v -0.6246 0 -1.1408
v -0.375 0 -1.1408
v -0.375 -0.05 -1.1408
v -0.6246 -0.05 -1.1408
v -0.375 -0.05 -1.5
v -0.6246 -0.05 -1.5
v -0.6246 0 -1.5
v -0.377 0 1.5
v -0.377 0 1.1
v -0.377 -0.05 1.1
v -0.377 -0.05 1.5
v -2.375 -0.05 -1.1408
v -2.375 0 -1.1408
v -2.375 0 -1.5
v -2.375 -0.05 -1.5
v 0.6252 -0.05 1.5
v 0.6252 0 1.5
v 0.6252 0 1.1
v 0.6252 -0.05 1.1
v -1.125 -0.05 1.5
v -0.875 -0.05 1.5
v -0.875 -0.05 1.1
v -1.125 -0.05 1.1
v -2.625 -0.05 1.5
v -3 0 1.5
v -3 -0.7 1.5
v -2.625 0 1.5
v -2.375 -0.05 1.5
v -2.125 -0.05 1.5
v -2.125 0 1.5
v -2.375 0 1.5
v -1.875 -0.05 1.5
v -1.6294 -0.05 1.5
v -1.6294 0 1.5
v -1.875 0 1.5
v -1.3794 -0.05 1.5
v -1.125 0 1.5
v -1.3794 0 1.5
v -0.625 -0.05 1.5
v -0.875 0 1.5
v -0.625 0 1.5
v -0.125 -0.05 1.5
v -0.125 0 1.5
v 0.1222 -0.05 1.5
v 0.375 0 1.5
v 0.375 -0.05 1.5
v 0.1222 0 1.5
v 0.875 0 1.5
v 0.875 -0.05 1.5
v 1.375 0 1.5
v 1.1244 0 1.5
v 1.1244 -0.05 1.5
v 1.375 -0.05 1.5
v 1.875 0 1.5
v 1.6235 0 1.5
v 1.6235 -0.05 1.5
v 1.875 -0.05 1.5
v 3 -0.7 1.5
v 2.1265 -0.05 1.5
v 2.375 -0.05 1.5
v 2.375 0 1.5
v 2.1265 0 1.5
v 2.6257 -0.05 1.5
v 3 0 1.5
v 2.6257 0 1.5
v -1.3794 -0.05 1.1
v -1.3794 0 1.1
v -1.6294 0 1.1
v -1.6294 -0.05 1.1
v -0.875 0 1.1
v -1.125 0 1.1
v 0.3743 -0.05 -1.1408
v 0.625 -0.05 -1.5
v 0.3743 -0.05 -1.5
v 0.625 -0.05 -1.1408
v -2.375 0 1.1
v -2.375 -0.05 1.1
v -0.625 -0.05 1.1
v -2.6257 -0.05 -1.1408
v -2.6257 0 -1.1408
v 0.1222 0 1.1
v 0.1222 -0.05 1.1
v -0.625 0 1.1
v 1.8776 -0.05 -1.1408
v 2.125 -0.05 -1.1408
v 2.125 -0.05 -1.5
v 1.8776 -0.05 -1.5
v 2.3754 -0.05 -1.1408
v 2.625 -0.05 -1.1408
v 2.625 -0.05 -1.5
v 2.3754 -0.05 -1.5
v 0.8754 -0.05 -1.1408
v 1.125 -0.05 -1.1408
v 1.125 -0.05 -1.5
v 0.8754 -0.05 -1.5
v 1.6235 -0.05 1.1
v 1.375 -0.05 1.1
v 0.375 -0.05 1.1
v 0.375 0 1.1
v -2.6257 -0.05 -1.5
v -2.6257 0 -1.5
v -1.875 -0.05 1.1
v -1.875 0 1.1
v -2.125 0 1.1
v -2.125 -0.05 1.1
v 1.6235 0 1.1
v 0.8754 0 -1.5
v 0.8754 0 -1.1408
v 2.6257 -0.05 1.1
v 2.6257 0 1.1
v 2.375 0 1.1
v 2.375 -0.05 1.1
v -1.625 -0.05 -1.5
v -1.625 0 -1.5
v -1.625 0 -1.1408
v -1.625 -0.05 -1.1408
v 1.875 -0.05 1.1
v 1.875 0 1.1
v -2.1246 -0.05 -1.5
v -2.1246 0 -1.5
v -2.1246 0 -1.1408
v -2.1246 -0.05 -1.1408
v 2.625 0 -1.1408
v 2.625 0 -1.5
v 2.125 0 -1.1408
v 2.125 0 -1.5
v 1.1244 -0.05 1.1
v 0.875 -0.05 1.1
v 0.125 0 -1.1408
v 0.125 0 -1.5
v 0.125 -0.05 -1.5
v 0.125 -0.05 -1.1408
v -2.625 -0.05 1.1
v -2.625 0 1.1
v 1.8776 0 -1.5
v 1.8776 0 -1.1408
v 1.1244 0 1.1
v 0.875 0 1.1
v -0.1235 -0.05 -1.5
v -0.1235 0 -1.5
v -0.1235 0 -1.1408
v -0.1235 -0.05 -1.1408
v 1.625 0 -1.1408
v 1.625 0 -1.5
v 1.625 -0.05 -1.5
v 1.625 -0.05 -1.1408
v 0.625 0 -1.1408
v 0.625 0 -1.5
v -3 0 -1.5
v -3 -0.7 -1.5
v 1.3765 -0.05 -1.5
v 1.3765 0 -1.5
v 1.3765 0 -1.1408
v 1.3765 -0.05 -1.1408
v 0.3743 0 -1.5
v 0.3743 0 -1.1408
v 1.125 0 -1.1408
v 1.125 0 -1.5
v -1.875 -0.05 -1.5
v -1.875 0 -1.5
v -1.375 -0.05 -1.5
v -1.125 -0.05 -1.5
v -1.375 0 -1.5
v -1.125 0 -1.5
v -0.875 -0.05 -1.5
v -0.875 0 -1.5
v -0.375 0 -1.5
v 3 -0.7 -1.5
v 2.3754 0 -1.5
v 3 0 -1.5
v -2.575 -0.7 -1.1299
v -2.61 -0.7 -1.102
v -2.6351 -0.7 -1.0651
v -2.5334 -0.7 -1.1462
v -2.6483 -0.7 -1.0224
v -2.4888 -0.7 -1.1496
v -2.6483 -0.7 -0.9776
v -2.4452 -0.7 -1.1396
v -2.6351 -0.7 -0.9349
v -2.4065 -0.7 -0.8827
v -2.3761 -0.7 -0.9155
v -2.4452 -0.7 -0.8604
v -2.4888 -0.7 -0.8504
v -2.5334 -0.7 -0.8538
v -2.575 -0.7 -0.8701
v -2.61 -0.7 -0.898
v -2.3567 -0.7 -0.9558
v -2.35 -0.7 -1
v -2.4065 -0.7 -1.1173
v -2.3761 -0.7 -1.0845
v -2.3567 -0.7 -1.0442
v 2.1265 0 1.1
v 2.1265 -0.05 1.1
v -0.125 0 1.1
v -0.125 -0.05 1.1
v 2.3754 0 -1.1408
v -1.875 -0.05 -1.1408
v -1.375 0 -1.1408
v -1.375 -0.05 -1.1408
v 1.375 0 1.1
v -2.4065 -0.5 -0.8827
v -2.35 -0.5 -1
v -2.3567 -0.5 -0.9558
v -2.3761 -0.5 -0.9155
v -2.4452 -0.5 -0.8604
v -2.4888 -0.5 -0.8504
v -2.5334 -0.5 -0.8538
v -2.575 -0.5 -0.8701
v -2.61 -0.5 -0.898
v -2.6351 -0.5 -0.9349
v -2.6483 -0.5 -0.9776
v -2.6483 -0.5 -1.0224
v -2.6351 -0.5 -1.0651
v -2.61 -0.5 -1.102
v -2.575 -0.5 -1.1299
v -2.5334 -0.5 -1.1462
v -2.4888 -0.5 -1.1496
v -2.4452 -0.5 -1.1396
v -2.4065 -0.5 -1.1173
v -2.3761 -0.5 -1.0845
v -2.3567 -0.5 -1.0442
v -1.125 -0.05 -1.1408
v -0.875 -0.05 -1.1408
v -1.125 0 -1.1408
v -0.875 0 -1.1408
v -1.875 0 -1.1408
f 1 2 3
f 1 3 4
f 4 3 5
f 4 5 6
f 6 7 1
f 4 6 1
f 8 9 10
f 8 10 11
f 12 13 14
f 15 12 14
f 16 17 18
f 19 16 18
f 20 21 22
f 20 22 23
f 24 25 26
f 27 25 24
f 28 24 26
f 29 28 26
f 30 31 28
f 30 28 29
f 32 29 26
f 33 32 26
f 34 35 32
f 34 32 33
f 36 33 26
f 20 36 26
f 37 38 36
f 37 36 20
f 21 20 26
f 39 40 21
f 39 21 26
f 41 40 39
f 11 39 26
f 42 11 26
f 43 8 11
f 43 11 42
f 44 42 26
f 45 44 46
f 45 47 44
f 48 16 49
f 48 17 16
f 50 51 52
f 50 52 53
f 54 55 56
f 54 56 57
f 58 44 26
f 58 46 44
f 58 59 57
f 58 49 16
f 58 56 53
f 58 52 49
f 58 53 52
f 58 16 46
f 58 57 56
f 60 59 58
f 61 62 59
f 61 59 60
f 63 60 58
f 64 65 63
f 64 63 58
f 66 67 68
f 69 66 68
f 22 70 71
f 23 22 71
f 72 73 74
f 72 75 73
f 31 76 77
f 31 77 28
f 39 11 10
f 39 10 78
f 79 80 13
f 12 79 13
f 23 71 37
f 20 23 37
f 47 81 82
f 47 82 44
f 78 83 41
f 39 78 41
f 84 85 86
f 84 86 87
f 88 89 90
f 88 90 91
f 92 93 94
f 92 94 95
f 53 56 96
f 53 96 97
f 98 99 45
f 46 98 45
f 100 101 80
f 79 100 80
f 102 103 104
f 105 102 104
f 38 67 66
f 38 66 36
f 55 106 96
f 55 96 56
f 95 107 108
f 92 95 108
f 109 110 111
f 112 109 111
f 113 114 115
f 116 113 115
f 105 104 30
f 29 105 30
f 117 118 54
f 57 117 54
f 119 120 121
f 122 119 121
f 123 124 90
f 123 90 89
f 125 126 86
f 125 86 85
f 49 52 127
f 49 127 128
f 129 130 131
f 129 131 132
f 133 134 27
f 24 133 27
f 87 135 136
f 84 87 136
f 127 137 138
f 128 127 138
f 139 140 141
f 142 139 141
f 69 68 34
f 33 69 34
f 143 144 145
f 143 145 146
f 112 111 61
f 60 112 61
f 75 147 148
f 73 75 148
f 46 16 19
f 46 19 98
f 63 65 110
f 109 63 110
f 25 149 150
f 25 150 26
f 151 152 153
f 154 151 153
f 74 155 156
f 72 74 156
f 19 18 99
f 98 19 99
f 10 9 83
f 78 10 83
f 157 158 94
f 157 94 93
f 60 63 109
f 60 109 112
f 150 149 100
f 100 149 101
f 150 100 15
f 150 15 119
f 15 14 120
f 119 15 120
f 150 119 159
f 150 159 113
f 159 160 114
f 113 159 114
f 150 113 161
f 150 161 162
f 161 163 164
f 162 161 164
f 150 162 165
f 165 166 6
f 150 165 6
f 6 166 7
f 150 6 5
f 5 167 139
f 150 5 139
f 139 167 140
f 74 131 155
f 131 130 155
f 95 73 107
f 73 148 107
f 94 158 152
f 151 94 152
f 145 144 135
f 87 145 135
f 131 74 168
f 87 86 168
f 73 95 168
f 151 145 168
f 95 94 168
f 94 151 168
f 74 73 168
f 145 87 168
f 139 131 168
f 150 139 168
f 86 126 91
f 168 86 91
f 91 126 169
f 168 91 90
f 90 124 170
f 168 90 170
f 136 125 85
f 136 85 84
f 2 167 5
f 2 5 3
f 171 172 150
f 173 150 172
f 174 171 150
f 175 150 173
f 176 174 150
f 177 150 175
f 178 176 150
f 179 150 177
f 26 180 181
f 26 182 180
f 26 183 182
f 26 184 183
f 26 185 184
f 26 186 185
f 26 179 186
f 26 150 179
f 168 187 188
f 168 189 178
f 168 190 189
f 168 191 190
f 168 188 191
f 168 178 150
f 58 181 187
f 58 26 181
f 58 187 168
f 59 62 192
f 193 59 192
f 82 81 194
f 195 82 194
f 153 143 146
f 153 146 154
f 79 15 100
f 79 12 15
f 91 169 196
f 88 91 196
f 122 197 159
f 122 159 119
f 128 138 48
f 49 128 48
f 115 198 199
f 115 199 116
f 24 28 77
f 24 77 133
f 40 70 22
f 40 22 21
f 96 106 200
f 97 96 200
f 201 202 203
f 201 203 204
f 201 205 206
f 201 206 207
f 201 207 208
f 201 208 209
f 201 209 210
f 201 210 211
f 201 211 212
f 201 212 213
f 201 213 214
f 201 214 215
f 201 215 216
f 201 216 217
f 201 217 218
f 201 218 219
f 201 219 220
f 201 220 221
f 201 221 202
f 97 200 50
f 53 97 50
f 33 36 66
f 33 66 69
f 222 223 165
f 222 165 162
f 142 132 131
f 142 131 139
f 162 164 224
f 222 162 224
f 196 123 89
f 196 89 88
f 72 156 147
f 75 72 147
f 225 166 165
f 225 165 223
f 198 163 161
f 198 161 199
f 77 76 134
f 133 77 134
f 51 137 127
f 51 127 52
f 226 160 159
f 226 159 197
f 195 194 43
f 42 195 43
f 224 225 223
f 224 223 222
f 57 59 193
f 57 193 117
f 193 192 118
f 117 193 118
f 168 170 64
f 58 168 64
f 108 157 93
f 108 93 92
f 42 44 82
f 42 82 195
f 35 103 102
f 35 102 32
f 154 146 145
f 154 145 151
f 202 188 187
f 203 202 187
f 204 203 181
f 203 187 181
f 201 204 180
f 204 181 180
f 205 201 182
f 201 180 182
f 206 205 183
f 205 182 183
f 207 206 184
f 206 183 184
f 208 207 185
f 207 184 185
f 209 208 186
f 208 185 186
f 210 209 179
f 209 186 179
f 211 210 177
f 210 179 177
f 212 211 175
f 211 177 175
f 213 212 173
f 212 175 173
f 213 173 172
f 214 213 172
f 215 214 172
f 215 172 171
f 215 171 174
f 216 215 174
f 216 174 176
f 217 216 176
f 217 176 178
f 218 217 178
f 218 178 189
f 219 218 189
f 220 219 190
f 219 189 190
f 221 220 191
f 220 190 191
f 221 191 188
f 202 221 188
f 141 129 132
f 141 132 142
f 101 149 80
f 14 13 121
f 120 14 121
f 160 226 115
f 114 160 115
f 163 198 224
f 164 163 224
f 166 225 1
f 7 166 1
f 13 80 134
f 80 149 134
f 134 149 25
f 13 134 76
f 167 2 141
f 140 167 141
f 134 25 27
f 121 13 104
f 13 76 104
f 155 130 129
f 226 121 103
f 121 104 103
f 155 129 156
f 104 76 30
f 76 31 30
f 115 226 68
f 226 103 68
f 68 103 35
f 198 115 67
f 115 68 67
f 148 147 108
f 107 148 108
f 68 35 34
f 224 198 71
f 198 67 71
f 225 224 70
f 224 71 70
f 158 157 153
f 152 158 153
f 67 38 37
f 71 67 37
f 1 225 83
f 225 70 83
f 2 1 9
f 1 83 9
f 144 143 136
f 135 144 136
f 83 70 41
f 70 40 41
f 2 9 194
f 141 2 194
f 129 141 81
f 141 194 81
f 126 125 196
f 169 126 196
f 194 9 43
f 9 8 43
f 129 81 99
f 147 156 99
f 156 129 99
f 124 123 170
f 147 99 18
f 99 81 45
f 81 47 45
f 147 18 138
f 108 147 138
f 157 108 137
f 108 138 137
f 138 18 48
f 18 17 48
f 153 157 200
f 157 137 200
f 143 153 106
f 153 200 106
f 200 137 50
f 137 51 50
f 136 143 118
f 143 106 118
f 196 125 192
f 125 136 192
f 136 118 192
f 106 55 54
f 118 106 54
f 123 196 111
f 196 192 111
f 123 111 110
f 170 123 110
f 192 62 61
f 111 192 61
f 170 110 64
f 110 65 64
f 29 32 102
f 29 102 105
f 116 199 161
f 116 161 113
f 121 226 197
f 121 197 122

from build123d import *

# Parameters (mm, degrees)
F0_W     = 6
F0_H     = 3
F1_DEPTH = 0.7
F2_R     = 0.15
F3_DEPTH = 0.2
F4_W     = 0.249578
F4_H     = 0.359219
F4_W_2   = 0.25
F4_W_3   = 0.249593
F4_W_4   = 0.248513
F4_W_5   = 0.249608
F4_W_6   = 0.248528
F4_W_7   = 0.247448
F4_W_8   = 0.249623
F4_W_9   = 0.248526
F4_H_2   = 0.4
F4_W_10  = 0.249373
F4_W_11  = 0.247199
F4_W_12  = 0.248047
F5_DEPTH = 0.05


with BuildPart() as f1:
    # F0 (on Front) → F1 (new body)
    with BuildSketch(Plane.XZ):
        Rectangle(F0_W, F0_H)
    extrude(amount=F1_DEPTH)

    # F2 (on face) → F3 (cut)
    with BuildSketch(Plane.XZ.offset(0.7)):
        with Locations((-2.5, -1)):
            Circle(F2_R)
    extrude(amount=-F3_DEPTH, mode=Mode.SUBTRACT)

    # F4 (on face) → F5 (cut)
    with BuildSketch(Plane(origin=(0, 0, 0), x_dir=(-1, 0, 0), z_dir=(0, 1, 0))):
        Polygon((2.375, -1.5), (2.625657, -1.5), (2.625657, -1.140781), (2.625, -1.140781), (2.375, -1.140781), align=None)
        with Locations((1.999789, -1.320391)):
            Rectangle(F4_W, F4_H)
        with Locations((1.5, -1.320391)):
            Rectangle(F4_W_2, F4_H)
        with Locations((1, -1.320391)):
            Rectangle(F4_W_2, F4_H)
        with Locations((0.499796, -1.320391)):
            Rectangle(F4_W_3, F4_H)
        with Locations((-0.000744, -1.320391)):
            Rectangle(F4_W_4, F4_H)
        Polygon((-0.625, -1.5), (-0.374313, -1.5), (-0.374313, -1.140781), (-0.375, -1.140781), (-0.625, -1.140781), align=None)
        with Locations((-1.000196, -1.320391)):
            Rectangle(F4_W_5, F4_H)
        with Locations((-1.500736, -1.320391)):
            Rectangle(F4_W_6, F4_H)
        with Locations((-2.001276, -1.320391)):
            Rectangle(F4_W_7, F4_H)
        with Locations((-2.500189, -1.320391)):
            Rectangle(F4_W_8, F4_H)
        Polygon((-2.375, 1.1), (-2.375, 1.5), (-2.6257, 1.5), (-2.6257, 1.1), (-2.625, 1.1), align=None)
        Polygon((-1.875, 1.1), (-1.875, 1.5), (-2.126548, 1.5), (-2.126548, 1.1), (-2.125, 1.1), align=None)
        with Locations((-1.499263, 1.3)):
            Rectangle(F4_W_9, F4_H_2)
        with Locations((-0.999686, 1.3)):
            Rectangle(F4_W_10, F4_H_2)
        Polygon((-0.375, 1.1), (-0.375, 1.5), (-0.625221, 1.5), (-0.625221, 1.1), (-0.625, 1.1), align=None)
        with Locations((0.001401, 1.3)):
            Rectangle(F4_W_11, F4_H_2)
        with Locations((0.500976, 1.3)):
            Rectangle(F4_W_12, F4_H_2)
        with Locations((1, 1.3)):
            Rectangle(F4_W_2, F4_H_2)
        with Locations((1.504384, 1.3)):
            Rectangle(F4_W_2, F4_H_2)
        with Locations((2, 1.3)):
            Rectangle(F4_W_2, F4_H_2)
        with Locations((2.5, 1.3)):
            Rectangle(F4_W_2, F4_H_2)
    extrude(amount=-F5_DEPTH, mode=Mode.SUBTRACT)


solid = f1.part
